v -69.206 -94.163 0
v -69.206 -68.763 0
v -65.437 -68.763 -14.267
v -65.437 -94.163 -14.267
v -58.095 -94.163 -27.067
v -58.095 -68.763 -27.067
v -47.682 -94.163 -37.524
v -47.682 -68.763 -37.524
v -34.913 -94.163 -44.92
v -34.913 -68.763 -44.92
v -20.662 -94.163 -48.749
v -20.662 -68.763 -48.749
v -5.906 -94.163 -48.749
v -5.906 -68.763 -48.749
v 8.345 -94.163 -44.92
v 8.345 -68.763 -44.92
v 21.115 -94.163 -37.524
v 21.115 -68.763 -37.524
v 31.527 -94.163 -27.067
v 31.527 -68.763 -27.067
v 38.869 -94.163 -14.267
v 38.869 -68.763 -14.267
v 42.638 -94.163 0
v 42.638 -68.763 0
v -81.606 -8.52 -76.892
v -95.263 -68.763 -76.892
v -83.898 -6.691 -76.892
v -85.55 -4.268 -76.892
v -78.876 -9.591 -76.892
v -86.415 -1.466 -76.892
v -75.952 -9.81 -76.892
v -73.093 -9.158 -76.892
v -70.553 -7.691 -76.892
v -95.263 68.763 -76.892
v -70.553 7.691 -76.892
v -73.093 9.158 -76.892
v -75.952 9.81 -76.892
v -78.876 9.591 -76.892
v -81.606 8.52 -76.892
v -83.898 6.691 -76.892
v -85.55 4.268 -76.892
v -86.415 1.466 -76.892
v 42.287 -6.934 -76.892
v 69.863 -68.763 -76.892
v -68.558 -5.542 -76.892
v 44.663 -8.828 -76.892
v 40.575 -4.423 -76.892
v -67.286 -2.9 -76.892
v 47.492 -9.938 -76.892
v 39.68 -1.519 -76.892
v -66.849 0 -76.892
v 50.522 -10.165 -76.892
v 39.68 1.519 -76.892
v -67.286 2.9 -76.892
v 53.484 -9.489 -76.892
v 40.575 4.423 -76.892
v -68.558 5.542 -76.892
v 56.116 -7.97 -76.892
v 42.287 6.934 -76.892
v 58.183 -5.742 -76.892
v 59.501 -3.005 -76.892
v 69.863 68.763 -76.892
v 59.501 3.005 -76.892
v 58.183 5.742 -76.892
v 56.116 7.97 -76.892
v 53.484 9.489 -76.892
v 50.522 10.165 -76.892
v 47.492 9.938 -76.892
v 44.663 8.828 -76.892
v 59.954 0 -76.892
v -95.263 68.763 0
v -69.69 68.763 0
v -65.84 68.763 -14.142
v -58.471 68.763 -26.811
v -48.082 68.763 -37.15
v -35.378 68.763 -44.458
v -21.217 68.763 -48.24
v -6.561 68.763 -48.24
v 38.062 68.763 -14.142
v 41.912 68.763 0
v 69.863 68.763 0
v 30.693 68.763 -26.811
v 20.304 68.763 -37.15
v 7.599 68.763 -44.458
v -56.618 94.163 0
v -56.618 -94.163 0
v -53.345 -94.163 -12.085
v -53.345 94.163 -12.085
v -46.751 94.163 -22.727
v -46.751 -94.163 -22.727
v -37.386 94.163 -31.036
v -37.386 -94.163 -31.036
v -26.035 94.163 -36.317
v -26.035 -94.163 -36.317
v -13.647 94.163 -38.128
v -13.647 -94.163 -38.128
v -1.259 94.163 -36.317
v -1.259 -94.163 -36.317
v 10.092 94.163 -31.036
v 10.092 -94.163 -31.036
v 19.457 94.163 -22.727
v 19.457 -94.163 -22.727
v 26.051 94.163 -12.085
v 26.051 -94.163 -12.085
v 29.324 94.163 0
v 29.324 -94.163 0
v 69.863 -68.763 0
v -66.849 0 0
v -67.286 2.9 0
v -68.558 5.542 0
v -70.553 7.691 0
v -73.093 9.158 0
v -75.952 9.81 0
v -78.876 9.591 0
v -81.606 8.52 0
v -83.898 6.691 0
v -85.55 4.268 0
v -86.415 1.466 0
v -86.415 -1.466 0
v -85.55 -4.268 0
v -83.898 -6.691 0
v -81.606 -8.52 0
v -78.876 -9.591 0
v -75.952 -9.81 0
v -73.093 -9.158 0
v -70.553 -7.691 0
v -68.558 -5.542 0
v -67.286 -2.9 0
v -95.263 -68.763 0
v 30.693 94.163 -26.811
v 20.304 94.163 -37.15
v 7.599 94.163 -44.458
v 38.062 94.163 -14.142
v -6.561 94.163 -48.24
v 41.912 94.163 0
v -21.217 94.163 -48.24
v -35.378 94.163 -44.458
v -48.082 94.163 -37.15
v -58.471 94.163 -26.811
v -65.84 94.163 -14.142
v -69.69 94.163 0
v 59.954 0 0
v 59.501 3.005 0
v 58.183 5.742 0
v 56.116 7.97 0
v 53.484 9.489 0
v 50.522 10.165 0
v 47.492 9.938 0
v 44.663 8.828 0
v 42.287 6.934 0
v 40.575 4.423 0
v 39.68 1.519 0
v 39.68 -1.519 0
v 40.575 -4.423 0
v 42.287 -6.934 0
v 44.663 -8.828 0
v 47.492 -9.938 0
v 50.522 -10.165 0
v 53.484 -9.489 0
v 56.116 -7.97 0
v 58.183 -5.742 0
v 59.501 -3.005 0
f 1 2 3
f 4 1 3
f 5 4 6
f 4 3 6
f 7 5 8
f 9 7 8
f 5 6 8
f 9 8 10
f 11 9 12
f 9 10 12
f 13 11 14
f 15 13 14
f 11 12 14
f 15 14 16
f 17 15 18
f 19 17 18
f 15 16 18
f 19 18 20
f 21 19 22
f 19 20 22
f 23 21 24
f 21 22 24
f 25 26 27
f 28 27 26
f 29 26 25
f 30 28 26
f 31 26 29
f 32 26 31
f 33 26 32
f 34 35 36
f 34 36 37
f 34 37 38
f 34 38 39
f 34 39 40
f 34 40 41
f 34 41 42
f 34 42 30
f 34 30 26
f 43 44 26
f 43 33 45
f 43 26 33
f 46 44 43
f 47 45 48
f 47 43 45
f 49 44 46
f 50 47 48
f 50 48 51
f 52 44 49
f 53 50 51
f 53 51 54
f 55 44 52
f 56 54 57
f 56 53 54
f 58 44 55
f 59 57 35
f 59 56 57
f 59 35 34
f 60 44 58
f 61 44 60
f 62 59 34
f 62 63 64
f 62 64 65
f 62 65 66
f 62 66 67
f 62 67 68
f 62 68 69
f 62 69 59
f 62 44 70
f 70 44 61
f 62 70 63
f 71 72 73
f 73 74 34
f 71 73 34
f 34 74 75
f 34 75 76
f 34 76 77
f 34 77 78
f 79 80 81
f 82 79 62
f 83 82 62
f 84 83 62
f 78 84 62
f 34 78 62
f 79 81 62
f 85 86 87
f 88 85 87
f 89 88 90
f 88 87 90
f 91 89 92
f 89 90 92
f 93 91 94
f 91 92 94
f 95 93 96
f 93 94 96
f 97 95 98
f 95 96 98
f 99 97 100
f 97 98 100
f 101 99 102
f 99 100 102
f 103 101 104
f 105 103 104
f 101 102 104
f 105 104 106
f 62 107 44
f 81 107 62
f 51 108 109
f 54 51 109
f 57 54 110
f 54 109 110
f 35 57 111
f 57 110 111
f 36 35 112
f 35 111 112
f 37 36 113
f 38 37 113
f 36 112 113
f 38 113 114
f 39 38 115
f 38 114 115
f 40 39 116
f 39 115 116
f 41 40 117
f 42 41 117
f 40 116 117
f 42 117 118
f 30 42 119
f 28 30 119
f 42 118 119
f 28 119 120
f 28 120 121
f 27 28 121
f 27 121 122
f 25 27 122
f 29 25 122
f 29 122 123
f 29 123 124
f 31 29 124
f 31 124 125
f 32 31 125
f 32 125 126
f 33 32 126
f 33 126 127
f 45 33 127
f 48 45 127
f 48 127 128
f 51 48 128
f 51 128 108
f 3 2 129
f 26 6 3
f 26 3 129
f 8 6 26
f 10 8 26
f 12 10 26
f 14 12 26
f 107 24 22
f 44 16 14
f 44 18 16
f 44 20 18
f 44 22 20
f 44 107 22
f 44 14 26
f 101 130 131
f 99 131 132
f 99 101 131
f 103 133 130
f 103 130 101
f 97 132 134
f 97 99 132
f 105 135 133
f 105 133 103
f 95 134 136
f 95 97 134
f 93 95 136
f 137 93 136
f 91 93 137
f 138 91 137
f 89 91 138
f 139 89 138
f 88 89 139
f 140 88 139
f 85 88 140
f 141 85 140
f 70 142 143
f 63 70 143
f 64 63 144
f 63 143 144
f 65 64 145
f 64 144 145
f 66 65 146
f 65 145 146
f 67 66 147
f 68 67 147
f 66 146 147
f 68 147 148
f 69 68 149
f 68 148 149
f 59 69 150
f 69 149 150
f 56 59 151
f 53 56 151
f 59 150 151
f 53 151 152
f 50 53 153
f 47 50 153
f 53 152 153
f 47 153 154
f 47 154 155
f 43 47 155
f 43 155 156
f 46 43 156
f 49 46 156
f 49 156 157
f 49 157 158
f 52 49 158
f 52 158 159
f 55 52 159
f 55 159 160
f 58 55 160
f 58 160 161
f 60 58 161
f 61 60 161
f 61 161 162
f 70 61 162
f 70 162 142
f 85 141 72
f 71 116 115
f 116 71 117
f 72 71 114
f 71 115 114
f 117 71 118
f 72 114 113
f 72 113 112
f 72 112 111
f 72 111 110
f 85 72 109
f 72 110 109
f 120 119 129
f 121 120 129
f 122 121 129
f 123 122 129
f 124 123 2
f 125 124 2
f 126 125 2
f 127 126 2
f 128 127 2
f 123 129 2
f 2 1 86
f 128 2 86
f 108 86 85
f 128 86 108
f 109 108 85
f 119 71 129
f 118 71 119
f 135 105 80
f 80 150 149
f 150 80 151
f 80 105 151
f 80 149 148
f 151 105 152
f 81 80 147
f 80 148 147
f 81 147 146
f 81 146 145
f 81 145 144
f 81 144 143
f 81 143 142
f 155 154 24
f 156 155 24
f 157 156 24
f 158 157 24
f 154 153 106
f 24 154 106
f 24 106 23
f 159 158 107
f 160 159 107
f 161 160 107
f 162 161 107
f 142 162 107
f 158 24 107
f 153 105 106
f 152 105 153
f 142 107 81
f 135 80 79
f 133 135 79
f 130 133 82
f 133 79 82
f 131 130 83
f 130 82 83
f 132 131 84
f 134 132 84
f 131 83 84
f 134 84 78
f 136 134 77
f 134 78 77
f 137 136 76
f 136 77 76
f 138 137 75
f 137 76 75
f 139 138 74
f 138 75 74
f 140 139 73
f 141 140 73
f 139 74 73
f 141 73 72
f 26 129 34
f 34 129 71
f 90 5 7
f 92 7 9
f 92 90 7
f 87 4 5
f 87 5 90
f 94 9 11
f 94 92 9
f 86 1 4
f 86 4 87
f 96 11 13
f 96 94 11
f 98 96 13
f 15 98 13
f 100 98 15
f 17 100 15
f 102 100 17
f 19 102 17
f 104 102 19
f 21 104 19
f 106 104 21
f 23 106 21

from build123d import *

# Parameters (mm, degrees)
F0_W      = 69.8630958796
F0_H      = 137.5265717506
F1_DEPTH  = 76.89179
F2_DEPTH  = 25.4
F3_DEPTH  = 25.4
F5_DEPTH  = 1676.4
F6_DEPTH  = 25.4
F8_DEPTH  = 25.4
F9_R      = 9.8377312504
F9_R_2    = 10.1939695419
F10_DEPTH = 2514.6


with BuildPart() as f1:
    # F0 (on Top) → F1 (new body)
    with BuildSketch(Plane.XY):
        with Locations((-34.9315479398, 0)):
            Rectangle(F0_W, F0_H)
        with Locations((34.9315479398, 0)):
            Rectangle(F0_W, F0_H)
    extrude(amount=-F1_DEPTH)

    # F2 (add): a face of the model
    f2_faces = [f1.faces().sort_by_distance(p)[0] for p in [
        (-69.8630958796, 0, -38.445895),
    ]]
    extrude(f2_faces, amount=-F2_DEPTH)

    # F3 (add): a face of the model
    f3_faces = [f1.faces().sort_by_distance(p)[0] for p in [
        (-69.8630958796, 0, -38.445895),
    ]]
    extrude(f3_faces, amount=F3_DEPTH)

    # F4 (on face) → F5 (cut)
    with BuildSketch(Plane.XZ.offset(68.7632858753)):
        with BuildLine():
            Line((29.3235648423, 0), (-56.6176436841, 0))
            ThreePointArc((-56.6176436841, 0), (-13.6470394209, -38.1281375917), (29.3235648423, 0))
        make_face()
    extrude(amount=-F5_DEPTH, mode=Mode.SUBTRACT)

    # F4 (on face) → F6 (join)
    with BuildSketch(Plane.XZ.offset(68.7632858753)):
        with BuildLine():
            Line((-56.6176436841, 0), (-69.2062154412, 0))
            ThreePointArc((-69.2062154412, 0), (-13.2839065045, -49.2343121992), (42.6384024322, 0))
            Line((42.6384024322, 0), (29.3235648423, 0))
            ThreePointArc((29.3235648423, 0), (-13.6470394209, -38.1281375917), (-56.6176436841, 0))
        make_face()
    extrude(amount=F6_DEPTH)

    # F7 (on face) → F8 (join)
    with BuildSketch(Plane(origin=(0, 68.7632858753, 0), x_dir=(-1, 0, 0), z_dir=(0, 1, 0))):
        with BuildLine():
            Line((-29.3235648423, 0), (-41.9121347368, 0))
            ThreePointArc((-41.9121347368, 0), (13.8891283423, -48.718451151), (69.6903914213, 0))
            Line((69.6903914213, 0), (56.6176436841, 0))
            ThreePointArc((56.6176436841, 0), (13.6470394209, -38.1281375917), (-29.3235648423, 0))
        make_face()
    extrude(amount=F8_DEPTH)

    # F9 (on face) → F10 (cut)
    with BuildSketch(Plane.XY):
        with Locations((-76.6867026687, 0)):
            Circle(F9_R)
        with Locations((49.7599355876, 0)):
            Circle(F9_R_2)
    extrude(amount=-F10_DEPTH, mode=Mode.SUBTRACT)


solid = f1.part
